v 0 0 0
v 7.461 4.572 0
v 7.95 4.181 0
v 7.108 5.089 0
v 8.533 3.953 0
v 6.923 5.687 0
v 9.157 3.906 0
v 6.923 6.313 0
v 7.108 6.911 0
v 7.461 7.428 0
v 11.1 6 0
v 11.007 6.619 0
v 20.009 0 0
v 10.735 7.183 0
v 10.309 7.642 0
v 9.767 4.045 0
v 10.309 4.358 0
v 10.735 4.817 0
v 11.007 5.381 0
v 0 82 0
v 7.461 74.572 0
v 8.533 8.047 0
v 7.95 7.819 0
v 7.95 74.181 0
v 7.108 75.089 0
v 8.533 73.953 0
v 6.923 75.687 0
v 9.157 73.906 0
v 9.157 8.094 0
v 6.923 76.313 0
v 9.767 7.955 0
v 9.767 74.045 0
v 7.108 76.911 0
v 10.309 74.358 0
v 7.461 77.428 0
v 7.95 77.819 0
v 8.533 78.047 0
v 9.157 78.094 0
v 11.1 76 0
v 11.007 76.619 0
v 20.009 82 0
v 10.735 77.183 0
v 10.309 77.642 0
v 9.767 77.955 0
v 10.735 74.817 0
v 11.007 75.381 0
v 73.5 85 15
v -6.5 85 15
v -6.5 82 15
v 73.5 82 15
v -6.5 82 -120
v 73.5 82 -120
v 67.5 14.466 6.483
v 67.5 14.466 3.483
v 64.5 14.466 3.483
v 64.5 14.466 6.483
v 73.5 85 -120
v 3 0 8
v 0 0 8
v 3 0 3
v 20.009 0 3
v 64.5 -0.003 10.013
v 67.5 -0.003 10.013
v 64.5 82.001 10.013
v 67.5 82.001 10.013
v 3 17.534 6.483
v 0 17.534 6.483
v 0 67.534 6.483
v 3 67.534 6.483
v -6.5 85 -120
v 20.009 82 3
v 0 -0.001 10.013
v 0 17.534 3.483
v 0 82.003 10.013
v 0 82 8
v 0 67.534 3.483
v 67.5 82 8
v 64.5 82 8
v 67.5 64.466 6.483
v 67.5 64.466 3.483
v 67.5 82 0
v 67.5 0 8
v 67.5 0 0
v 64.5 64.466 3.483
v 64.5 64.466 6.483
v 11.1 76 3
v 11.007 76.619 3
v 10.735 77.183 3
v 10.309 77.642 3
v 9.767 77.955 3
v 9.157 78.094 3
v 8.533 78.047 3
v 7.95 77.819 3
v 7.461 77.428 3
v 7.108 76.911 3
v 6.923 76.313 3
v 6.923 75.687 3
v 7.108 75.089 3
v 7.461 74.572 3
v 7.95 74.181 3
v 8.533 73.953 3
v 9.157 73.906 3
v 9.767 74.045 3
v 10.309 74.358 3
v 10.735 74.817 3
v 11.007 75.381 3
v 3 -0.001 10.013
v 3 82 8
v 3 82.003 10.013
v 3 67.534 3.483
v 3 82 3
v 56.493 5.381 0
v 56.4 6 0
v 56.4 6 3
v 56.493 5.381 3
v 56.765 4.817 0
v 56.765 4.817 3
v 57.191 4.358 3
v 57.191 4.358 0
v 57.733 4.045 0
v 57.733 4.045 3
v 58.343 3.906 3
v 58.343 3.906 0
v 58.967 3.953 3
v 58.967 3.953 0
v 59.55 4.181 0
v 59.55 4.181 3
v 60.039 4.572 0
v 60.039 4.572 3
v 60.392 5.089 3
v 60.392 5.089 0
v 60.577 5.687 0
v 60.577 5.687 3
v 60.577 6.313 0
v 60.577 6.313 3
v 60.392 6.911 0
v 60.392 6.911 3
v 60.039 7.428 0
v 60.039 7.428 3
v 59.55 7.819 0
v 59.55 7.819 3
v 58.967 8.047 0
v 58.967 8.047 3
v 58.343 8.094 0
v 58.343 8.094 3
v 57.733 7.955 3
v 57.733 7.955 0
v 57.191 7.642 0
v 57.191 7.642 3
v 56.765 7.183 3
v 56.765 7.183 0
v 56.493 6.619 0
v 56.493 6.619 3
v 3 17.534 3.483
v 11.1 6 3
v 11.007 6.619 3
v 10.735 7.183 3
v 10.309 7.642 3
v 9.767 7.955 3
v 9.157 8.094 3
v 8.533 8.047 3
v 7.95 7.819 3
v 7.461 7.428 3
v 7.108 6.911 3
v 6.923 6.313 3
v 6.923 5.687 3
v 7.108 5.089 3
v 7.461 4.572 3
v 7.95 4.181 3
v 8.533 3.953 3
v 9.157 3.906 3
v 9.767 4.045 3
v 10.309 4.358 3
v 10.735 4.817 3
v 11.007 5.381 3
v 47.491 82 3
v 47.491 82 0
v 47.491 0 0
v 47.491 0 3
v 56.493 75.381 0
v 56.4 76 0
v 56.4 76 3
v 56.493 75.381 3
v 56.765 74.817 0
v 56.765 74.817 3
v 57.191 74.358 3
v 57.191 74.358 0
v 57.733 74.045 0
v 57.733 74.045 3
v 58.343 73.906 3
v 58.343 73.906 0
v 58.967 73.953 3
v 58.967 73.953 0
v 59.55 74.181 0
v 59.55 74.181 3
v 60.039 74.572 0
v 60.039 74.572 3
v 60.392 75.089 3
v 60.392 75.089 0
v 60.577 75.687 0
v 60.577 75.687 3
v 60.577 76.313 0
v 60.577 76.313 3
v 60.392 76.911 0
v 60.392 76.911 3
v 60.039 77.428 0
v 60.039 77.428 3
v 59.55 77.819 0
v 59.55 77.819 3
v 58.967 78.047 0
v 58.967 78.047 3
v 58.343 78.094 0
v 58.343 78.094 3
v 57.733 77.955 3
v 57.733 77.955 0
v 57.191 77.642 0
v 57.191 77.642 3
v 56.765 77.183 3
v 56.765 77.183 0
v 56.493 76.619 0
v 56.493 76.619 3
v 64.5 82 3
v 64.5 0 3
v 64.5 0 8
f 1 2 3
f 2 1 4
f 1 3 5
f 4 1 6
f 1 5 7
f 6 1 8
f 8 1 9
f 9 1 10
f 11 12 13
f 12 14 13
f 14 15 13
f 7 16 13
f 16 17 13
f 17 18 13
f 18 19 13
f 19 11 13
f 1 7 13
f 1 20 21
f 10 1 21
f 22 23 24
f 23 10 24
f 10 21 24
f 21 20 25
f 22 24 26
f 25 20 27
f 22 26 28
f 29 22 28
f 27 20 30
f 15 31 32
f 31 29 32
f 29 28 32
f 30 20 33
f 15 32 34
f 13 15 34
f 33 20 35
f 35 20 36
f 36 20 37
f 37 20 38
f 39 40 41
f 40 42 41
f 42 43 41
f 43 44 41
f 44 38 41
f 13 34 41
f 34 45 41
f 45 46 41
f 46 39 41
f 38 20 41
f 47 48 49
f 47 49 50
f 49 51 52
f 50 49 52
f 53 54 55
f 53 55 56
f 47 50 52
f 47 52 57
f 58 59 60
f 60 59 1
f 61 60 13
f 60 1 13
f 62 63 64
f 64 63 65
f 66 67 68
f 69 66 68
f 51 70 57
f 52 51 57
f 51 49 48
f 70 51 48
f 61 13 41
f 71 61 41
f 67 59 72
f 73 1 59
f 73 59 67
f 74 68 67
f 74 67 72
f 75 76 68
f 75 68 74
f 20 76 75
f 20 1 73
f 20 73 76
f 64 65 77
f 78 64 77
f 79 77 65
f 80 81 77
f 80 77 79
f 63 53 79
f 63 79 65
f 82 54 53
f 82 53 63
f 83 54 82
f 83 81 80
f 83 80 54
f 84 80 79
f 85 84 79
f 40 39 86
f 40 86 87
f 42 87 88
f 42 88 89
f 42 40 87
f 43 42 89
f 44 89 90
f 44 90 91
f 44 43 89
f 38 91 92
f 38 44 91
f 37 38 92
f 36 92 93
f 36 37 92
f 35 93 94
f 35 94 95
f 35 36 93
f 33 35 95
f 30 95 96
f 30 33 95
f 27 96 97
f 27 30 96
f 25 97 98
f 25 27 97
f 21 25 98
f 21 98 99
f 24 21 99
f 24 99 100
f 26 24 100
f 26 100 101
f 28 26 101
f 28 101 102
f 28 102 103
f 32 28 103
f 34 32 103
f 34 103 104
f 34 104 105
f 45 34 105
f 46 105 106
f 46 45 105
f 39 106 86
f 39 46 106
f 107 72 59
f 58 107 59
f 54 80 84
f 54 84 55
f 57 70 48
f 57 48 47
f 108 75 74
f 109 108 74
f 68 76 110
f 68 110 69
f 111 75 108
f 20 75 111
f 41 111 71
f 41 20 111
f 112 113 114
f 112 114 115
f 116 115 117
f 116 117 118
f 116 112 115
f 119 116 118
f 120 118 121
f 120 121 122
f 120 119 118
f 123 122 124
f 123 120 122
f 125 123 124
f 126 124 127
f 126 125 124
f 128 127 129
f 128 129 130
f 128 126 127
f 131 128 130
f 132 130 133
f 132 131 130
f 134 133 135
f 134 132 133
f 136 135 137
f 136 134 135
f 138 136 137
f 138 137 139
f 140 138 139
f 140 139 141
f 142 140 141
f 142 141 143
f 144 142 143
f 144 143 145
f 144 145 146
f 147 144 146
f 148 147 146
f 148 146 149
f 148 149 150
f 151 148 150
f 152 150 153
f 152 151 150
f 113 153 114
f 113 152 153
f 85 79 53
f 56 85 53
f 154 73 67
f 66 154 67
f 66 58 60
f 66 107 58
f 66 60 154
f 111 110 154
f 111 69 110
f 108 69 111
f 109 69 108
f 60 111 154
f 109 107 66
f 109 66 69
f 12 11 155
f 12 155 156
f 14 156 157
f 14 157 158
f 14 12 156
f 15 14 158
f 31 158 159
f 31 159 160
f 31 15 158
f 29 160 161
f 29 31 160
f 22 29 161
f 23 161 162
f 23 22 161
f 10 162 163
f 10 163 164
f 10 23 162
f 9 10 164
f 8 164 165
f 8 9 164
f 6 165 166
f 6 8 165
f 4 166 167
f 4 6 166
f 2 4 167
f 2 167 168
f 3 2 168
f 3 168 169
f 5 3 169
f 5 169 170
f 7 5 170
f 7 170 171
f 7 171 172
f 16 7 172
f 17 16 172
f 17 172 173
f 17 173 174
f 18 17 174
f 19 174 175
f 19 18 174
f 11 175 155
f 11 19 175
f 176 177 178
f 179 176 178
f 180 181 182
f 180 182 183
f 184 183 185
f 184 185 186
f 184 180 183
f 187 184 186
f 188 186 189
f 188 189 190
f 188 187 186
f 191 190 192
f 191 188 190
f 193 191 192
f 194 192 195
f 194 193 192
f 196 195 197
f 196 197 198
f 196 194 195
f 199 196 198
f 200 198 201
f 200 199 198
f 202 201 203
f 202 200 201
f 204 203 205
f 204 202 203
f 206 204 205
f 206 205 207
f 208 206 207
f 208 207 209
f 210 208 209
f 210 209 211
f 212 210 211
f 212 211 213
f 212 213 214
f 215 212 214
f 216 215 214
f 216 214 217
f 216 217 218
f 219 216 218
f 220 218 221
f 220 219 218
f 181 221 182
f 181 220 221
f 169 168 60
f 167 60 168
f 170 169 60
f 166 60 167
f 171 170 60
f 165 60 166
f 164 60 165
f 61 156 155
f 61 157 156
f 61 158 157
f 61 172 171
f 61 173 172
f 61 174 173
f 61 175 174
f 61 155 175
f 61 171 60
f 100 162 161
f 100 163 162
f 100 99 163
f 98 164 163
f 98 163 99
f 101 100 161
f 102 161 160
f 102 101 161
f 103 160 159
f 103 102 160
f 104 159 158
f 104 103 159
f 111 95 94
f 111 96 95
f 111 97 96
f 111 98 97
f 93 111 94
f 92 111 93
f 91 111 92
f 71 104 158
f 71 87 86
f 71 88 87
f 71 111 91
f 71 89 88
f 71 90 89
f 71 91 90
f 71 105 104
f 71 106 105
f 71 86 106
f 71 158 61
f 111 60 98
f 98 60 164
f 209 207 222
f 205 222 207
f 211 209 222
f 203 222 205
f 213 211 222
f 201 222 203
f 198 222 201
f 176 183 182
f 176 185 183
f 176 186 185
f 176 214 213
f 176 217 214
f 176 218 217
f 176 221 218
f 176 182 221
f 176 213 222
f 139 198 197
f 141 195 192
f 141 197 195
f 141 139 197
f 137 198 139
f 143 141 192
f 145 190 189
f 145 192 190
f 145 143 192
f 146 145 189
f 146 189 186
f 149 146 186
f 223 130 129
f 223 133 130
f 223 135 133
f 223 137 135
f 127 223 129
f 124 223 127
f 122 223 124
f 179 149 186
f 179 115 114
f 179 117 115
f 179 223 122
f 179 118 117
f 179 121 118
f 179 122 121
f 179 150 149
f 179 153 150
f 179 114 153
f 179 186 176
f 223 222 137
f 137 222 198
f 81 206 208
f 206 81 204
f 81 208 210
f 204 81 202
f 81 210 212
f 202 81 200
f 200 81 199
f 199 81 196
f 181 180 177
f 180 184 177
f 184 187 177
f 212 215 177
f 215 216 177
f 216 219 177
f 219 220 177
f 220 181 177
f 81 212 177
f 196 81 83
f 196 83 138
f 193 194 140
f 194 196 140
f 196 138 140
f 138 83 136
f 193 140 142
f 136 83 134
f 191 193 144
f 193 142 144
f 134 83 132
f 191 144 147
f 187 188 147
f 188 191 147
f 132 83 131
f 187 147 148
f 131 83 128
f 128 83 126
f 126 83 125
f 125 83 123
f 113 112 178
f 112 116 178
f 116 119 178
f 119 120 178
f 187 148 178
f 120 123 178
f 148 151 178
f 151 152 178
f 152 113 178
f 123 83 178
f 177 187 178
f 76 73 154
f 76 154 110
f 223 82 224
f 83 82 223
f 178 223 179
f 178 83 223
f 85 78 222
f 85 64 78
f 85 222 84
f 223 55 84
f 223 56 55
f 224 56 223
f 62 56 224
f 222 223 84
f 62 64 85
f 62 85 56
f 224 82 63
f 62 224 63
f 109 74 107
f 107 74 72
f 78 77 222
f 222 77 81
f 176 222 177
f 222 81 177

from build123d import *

# Parameters (mm, degrees)
SKETCH001_W               = 50
SKETCH001_H               = 3
PAD001_DEPTH              = 3
SKETCH_W                  = 20.009204
SKETCH_H                  = 82
SKETCH_R                  = 2.1
PAD_DEPTH                 = 3
BOX_W                     = 80
BOX_H                     = 3
BOX_DEPTH                 = 135
FUSION001_PLACEMENT_ANGLE = 180


with BuildPart() as pad001:
    # Sketch001 → Pad001 (new body)
    with BuildSketch(Plane.YZ):
        Polygon((0, 0), (82, 0), (82, 8), (82.002632, 10.013409), (-0.000823, 10.013409), (0, 8), align=None)
        with Locations((42.5338, 4.983344)):
            Rectangle(SKETCH001_W, SKETCH001_H, mode=Mode.SUBTRACT)
    extrude(amount=PAD001_DEPTH)


with BuildPart() as pad:
    # Sketch → Pad (new body)
    with BuildSketch(Plane.XY):
        with Locations((10.004602, 41)):
            Rectangle(SKETCH_W, SKETCH_H)
        with Locations((9, 6)):
            Circle(SKETCH_R, mode=Mode.SUBTRACT)
        with Locations((9, 76)):
            Circle(SKETCH_R, mode=Mode.SUBTRACT)
    extrude(amount=PAD_DEPTH)


with BuildPart() as fusion:
    # Fusion base: copy of Pad
    add(pad.part)

    # Fusion: union Pad001
    add(pad001.part)


with BuildPart() as cube:
    # Box → Box (new body)
    with BuildSketch(Plane(origin=(-6.5, 82, -120), x_dir=(1, 0, 0), z_dir=(0, 0, 1))):
        with Locations((40, 1.5)):
            Rectangle(BOX_W, BOX_H)
    extrude(amount=BOX_DEPTH)


with BuildPart() as fusion001:
    # Fusion001 base: copy of Pad
    add(pad.part)

    # Fusion001: union Pad001
    add(pad001.part)


with BuildPart() as fusion001_1:
    # Fusion001 placement: moved
    add(fusion001.part.moved(Location((67.5, 82, 0))).rotate(Axis((67.5, 82, 0), (0, 0, 1)), FUSION001_PLACEMENT_ANGLE))


solid = Compound([fusion.part, cube.part, fusion001_1.part])
